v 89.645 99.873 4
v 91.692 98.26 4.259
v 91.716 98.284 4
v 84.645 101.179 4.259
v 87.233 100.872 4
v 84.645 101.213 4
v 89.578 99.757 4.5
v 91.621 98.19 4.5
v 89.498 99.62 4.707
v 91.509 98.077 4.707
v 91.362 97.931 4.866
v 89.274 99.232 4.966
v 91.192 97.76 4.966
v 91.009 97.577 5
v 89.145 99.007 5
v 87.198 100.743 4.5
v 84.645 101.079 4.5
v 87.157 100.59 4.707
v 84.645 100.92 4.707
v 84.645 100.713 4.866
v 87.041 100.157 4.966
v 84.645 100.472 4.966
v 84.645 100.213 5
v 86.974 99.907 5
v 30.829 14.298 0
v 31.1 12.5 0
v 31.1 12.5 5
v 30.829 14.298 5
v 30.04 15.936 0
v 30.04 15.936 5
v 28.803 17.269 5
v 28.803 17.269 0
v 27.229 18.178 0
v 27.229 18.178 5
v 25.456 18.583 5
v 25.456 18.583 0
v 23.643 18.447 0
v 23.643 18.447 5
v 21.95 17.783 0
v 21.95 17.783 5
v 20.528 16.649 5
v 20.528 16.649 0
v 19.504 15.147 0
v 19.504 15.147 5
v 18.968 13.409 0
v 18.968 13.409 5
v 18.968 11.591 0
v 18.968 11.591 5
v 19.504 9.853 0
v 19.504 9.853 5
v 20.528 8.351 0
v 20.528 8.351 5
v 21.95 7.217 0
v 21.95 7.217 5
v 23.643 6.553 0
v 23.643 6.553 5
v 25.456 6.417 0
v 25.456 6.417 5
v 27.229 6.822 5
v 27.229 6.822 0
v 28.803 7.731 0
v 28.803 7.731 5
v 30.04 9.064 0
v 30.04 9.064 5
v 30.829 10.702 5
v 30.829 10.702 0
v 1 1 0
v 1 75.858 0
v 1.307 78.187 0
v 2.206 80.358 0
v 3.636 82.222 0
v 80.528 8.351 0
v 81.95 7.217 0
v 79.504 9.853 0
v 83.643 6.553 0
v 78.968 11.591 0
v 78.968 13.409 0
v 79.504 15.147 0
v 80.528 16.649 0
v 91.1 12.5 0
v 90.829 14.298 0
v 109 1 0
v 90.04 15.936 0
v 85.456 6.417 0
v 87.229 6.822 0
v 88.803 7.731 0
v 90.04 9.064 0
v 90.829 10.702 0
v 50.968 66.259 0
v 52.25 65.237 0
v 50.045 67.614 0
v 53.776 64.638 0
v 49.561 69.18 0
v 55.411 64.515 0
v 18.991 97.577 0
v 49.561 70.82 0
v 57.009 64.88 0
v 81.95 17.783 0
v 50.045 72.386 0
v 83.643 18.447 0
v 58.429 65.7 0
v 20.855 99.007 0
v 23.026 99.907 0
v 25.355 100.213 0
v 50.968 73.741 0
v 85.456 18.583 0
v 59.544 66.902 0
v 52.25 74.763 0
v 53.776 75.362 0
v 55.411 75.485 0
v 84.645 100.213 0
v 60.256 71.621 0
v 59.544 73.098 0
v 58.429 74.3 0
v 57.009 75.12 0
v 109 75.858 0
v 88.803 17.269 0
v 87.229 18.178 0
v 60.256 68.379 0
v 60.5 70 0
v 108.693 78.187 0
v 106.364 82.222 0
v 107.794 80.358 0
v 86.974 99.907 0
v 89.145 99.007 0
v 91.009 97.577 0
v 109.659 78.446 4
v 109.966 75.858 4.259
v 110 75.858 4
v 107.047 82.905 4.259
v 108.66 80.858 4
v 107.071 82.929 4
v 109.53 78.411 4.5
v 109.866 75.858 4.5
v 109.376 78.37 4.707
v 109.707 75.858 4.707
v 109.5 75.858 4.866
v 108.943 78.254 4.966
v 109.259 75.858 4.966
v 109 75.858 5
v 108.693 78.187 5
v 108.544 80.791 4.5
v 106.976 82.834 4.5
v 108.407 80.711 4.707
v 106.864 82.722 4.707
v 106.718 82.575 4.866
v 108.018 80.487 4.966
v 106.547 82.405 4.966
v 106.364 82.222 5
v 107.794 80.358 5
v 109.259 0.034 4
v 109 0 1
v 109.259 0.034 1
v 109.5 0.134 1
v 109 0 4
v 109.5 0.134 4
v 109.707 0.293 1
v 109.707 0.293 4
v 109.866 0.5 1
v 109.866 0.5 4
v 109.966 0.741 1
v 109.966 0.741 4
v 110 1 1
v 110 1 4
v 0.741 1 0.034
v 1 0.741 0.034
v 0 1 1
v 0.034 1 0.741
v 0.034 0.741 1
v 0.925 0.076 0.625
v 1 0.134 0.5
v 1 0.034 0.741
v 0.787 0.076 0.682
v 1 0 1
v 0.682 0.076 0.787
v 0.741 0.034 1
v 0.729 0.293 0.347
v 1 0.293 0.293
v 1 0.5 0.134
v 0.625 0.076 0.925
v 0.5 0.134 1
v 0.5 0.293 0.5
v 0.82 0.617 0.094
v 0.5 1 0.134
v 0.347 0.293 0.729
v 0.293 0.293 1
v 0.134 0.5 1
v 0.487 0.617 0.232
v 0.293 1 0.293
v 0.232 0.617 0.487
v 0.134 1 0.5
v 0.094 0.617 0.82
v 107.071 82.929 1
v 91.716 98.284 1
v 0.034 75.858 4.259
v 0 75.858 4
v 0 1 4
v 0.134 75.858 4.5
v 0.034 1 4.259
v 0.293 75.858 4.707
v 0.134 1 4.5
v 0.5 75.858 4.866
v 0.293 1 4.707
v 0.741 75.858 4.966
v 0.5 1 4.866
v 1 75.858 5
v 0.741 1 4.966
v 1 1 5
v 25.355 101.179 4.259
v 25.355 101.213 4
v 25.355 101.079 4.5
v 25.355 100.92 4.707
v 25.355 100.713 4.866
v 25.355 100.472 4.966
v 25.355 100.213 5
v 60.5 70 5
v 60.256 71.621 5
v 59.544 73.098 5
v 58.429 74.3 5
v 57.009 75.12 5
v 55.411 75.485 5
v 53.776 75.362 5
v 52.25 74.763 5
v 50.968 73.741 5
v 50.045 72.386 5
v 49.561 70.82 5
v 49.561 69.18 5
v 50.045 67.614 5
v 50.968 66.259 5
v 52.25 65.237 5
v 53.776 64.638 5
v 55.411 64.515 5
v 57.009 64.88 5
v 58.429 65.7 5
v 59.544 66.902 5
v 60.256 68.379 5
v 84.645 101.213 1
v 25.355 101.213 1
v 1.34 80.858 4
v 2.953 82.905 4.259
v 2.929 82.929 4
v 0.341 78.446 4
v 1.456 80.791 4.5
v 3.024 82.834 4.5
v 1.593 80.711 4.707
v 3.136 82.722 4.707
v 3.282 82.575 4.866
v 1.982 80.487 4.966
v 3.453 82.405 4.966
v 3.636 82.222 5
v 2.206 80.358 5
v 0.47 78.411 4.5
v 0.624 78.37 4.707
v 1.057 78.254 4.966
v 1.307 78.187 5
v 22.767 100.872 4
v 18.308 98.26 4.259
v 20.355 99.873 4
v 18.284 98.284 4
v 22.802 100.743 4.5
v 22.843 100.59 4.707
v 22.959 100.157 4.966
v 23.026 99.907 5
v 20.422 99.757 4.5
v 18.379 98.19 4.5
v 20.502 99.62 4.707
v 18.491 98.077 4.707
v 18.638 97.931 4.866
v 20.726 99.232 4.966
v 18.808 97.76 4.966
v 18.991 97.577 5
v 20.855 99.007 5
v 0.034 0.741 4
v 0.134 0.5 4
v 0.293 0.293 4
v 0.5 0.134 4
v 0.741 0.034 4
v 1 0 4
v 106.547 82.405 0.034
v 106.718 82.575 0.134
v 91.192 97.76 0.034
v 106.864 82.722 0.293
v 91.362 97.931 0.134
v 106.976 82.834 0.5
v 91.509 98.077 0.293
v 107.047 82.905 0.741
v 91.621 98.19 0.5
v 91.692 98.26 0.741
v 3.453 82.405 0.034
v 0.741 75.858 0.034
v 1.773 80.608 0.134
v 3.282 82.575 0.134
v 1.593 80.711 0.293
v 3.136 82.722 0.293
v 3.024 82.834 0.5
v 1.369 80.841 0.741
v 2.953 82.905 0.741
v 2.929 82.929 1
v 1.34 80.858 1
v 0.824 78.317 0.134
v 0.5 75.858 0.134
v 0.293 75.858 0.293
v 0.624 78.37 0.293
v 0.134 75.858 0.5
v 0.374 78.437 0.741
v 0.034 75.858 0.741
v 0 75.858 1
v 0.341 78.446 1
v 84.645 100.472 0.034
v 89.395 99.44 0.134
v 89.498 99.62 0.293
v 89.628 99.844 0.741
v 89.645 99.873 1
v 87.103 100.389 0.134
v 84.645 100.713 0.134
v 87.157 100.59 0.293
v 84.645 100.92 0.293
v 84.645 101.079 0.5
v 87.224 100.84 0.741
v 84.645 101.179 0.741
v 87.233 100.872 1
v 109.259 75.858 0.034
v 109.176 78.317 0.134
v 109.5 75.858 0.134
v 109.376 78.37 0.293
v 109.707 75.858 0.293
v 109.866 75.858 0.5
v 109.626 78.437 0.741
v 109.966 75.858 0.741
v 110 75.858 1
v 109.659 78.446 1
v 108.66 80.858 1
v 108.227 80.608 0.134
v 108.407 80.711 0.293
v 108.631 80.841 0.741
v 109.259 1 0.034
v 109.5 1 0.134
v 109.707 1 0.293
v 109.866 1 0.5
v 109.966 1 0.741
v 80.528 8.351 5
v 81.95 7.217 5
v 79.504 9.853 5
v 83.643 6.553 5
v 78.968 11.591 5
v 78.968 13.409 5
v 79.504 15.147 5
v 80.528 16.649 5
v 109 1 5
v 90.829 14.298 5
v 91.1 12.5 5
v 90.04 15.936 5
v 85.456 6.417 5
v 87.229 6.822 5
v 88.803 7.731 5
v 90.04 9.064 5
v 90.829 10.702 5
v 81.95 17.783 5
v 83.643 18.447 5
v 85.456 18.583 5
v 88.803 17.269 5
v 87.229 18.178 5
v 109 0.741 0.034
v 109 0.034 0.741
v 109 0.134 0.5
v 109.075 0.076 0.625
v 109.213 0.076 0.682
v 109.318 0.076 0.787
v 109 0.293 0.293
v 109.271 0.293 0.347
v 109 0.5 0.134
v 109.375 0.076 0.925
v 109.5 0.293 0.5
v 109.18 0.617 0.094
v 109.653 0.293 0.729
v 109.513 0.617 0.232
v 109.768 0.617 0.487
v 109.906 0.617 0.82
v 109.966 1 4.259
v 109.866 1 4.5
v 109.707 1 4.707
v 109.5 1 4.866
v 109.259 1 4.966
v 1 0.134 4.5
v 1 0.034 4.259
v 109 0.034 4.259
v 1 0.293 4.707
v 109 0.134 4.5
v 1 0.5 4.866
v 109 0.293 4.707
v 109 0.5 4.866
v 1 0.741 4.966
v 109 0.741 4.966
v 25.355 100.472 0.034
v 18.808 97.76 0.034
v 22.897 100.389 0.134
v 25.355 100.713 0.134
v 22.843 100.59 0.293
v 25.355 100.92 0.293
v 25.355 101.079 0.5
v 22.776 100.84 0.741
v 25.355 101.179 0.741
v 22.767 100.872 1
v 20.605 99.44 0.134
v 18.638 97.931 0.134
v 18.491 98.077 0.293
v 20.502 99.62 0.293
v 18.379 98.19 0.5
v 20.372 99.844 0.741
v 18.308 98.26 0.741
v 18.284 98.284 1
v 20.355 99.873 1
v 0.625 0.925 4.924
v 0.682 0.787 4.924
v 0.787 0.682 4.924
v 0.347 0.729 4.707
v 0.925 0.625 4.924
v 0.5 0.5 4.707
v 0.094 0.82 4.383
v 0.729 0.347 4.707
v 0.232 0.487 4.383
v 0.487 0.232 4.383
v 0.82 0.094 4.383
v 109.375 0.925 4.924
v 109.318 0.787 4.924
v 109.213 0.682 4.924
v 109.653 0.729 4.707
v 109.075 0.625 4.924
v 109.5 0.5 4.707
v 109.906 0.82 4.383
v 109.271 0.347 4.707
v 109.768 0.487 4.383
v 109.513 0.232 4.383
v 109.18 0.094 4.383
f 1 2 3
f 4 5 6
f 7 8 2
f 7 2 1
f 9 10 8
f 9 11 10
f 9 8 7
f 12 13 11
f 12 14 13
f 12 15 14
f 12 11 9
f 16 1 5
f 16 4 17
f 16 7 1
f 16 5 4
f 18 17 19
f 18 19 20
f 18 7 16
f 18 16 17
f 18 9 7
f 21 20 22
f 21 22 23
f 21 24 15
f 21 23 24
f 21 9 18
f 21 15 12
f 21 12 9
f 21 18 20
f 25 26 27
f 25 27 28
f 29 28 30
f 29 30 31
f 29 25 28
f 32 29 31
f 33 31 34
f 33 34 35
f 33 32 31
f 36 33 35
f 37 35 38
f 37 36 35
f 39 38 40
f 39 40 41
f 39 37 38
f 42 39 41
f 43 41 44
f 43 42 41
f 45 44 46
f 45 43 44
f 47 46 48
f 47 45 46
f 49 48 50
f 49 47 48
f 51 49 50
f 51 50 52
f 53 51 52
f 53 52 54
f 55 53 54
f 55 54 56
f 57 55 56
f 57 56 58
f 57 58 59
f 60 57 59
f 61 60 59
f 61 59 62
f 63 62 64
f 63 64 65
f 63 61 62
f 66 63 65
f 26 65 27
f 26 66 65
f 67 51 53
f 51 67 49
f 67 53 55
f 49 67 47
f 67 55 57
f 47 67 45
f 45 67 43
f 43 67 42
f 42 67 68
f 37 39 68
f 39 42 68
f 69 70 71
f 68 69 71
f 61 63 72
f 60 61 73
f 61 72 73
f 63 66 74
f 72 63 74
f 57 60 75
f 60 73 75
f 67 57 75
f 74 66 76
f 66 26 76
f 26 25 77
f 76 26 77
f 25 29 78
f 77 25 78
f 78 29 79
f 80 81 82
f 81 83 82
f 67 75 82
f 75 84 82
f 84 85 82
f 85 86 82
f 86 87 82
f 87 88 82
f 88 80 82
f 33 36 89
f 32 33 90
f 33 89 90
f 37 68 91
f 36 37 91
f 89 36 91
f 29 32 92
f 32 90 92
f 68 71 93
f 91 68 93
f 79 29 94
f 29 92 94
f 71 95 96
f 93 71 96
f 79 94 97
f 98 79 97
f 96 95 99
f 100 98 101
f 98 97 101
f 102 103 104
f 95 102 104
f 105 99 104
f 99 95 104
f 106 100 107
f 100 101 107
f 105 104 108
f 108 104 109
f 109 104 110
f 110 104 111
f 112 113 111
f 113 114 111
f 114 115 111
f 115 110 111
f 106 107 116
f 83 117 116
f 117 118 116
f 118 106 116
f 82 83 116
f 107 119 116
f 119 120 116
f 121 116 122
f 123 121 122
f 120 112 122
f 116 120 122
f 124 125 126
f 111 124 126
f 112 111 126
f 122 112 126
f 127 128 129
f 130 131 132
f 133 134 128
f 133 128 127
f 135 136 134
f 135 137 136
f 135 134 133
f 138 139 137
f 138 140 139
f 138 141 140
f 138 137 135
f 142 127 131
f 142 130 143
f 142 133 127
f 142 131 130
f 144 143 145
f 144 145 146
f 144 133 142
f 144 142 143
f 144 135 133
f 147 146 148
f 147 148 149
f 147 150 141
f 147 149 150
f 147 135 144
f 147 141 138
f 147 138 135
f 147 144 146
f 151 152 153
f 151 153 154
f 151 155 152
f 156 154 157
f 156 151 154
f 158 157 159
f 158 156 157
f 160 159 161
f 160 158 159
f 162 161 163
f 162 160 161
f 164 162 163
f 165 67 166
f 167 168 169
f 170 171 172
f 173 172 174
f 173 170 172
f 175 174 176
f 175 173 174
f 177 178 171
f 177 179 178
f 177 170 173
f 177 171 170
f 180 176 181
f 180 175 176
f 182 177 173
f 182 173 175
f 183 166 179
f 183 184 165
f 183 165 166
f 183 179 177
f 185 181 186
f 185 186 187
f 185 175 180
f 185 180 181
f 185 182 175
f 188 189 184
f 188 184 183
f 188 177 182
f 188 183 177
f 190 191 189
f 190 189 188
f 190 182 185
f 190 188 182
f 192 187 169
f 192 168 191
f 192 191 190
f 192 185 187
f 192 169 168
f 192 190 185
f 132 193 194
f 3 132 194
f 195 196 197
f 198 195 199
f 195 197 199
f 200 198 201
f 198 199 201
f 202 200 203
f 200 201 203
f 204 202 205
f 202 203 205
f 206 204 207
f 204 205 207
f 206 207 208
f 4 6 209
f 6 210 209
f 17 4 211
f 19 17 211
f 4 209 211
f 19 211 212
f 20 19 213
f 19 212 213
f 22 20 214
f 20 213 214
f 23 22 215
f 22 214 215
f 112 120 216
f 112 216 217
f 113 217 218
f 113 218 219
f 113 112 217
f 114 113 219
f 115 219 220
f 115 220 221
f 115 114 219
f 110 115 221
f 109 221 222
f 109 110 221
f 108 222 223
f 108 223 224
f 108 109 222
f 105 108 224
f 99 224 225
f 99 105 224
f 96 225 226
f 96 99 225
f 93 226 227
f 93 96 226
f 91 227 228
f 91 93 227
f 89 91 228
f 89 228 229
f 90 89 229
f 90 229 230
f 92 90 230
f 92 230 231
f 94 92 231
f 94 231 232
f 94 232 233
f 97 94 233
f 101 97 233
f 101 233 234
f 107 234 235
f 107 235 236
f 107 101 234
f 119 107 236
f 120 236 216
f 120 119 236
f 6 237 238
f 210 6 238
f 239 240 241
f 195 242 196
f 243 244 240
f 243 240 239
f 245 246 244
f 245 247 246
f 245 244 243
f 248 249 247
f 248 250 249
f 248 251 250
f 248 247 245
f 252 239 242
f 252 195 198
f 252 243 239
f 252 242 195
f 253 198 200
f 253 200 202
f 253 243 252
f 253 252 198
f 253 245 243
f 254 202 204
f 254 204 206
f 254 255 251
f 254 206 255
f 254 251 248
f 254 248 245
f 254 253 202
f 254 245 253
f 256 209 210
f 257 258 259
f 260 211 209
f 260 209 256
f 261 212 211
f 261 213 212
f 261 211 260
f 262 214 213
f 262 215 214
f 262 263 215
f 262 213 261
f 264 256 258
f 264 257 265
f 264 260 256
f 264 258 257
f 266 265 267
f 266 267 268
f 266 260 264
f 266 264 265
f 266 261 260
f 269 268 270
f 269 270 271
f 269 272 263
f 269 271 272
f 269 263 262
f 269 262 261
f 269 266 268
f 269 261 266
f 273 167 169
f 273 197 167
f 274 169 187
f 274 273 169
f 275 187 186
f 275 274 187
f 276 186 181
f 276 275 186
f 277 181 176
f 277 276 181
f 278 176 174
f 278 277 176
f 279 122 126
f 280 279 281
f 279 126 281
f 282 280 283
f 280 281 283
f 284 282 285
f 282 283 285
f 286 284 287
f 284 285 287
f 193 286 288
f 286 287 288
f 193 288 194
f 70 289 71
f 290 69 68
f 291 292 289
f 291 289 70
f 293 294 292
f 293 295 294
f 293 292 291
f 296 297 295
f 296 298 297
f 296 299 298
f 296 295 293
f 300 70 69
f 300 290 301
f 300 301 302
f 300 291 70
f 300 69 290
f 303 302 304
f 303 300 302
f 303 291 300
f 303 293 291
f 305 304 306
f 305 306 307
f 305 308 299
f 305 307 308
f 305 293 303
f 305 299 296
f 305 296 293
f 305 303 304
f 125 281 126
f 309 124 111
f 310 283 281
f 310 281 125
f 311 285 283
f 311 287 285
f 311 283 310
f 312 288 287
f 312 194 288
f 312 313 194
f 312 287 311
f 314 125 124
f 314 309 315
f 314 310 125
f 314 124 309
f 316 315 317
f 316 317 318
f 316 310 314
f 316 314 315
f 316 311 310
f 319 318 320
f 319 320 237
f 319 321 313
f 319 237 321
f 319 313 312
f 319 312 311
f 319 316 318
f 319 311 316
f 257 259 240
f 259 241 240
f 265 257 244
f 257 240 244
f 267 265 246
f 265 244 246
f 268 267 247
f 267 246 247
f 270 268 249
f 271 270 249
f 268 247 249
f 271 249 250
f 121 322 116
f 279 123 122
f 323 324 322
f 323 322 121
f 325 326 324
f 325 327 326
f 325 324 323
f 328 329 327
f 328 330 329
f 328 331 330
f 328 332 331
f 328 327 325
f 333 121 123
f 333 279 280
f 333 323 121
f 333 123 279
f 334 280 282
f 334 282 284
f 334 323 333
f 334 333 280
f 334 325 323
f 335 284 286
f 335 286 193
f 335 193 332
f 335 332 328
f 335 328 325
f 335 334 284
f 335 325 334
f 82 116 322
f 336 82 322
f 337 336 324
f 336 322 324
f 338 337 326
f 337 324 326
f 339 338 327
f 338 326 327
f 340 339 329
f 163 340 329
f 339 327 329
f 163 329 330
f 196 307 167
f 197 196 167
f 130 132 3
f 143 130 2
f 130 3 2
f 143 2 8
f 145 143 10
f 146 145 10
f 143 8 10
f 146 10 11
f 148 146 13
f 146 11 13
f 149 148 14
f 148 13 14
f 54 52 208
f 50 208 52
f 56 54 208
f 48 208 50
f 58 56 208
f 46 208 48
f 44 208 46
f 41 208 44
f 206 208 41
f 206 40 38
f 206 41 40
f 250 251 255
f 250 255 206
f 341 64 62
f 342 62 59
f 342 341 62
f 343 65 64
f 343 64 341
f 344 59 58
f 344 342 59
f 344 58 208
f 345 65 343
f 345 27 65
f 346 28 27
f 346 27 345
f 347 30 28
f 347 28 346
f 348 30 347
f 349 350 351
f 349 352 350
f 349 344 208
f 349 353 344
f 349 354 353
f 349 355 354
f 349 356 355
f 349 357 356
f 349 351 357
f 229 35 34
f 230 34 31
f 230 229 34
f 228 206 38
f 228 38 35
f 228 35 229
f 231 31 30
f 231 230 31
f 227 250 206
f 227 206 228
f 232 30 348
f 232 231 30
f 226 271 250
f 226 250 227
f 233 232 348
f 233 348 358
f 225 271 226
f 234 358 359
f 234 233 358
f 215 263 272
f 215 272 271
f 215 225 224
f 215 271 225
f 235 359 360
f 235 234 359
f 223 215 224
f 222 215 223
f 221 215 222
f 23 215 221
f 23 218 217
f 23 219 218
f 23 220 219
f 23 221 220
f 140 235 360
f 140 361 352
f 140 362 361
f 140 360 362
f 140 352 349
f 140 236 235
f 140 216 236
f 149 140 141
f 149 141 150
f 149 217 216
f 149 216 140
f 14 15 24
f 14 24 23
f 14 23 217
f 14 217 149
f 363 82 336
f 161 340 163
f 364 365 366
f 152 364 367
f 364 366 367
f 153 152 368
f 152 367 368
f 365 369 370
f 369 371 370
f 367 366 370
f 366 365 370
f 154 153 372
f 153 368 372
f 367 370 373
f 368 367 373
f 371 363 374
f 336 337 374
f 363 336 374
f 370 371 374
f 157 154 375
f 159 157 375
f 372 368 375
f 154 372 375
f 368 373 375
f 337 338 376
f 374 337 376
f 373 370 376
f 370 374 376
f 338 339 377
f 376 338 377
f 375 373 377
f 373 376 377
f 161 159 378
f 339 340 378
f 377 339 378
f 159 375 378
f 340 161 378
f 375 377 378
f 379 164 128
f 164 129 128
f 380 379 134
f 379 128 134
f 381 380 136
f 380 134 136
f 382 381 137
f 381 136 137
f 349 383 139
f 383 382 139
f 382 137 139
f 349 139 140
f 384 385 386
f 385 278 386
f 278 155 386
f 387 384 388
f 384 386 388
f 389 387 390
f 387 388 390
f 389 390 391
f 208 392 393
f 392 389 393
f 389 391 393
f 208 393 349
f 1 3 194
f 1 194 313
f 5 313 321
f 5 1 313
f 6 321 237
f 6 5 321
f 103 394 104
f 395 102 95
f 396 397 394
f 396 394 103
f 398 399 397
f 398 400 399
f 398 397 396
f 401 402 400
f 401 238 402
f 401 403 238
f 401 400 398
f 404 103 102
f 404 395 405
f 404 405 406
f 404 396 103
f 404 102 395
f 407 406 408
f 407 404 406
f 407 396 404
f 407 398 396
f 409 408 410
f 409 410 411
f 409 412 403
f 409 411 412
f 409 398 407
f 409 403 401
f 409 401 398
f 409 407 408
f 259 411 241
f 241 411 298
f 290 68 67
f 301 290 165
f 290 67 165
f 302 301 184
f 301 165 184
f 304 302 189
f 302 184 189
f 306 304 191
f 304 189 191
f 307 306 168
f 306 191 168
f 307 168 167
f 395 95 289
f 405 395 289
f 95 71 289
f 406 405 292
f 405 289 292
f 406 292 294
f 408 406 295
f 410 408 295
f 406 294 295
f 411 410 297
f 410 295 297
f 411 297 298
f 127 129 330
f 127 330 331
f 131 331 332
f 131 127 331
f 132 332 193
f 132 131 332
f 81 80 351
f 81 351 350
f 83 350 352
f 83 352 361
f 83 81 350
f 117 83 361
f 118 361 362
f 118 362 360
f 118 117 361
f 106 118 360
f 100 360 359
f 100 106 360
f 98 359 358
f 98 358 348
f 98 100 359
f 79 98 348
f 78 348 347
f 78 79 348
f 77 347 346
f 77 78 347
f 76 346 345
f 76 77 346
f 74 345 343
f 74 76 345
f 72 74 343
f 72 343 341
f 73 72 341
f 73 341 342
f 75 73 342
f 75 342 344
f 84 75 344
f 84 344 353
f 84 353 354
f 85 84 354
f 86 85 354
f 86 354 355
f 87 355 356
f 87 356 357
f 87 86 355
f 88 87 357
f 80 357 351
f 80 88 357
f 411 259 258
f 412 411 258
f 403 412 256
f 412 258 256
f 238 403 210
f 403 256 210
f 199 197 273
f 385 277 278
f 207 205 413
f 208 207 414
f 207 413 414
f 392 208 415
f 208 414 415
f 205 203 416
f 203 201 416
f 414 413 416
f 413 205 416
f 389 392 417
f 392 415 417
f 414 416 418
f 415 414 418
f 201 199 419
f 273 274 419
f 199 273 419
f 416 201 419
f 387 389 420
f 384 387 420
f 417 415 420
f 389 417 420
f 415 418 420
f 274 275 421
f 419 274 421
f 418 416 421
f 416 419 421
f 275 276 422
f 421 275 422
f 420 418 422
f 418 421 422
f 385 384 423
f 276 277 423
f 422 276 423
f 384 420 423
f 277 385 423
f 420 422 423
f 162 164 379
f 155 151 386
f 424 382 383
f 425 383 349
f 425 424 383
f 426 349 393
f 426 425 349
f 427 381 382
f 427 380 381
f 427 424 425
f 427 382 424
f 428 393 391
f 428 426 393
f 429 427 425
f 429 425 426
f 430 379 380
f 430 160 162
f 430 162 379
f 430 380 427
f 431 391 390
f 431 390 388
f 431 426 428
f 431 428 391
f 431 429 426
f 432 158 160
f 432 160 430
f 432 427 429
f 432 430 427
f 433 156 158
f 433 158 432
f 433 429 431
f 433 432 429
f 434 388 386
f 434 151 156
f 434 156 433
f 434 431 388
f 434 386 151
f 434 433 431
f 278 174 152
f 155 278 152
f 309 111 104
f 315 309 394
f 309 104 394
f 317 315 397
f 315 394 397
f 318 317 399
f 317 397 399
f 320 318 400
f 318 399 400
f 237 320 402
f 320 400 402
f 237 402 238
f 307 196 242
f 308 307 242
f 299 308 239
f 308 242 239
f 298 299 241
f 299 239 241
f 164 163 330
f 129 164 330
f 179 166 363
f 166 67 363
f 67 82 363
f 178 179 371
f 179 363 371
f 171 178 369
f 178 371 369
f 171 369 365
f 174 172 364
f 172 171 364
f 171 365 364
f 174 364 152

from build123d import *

# Parameters (mm, degrees)
SKETCH1_R           = 6.1
SKETCH1_R_2         = 5.5
BOSS_EXTRUDE1_DEPTH = 5
FILLET1_R           = 10
FILLET2_R           = 1


with BuildPart() as part:
    # Sketch1 → Boss-Extrude1 (new body)
    with BuildSketch(Plane.XY):
        Polygon((0, 0), (110, 0), (110, 80), (88.786796564, 101.213203436), (21.213203436, 101.213203436), (0, 80), align=None)
        with Locations((25, 12.5)):
            Circle(SKETCH1_R, mode=Mode.SUBTRACT)
        with Locations((85, 12.5)):
            Circle(SKETCH1_R, mode=Mode.SUBTRACT)
        with Locations((55, 70)):
            Circle(SKETCH1_R_2, mode=Mode.SUBTRACT)
    extrude(amount=BOSS_EXTRUDE1_DEPTH)

    # Fillet1
    fillet1_edges = [part.edges().sort_by_distance(p)[0] for p in [
        (110, 80, 2.5),
        (0, 80, 2.5),
        (21.213203436, 101.213203436, 2.5),
        (88.786796564, 101.213203436, 2.5),
    ]]
    fillet(fillet1_edges, radius=FILLET1_R)

    # Fillet2
    fillet2_edges = [part.edges().sort_by_distance(p)[0] for p in [
        (110, 37.928932188, 0),
        (55, 0, 0),
        (0, 37.928932188, 0),
        (110, 0, 2.5),
        (0, 0, 2.5),
        (0, 37.928932188, 5),
        (55, 0, 5),
        (99.393398282, 90.606601718, 0),
        (99.393398282, 90.606601718, 5),
        (10.606601718, 90.606601718, 0),
        (55, 101.213203436, 0),
        (21.528504736, 100.451998761, 0),
        (110, 37.928932188, 5),
        (0.761204675, 79.6846987, 0),
        (88.471495264, 100.451998761, 0),
        (109.238795325, 79.6846987, 0),
        (55, 101.213203436, 5),
        (10.606601718, 90.606601718, 5),
        (21.528504736, 100.451998761, 5),
        (0.761204675, 79.6846987, 5),
        (88.471495264, 100.451998761, 5),
        (109.238795325, 79.6846987, 5),
    ]]
    fillet(fillet2_edges, radius=FILLET2_R)


solid = part.part
